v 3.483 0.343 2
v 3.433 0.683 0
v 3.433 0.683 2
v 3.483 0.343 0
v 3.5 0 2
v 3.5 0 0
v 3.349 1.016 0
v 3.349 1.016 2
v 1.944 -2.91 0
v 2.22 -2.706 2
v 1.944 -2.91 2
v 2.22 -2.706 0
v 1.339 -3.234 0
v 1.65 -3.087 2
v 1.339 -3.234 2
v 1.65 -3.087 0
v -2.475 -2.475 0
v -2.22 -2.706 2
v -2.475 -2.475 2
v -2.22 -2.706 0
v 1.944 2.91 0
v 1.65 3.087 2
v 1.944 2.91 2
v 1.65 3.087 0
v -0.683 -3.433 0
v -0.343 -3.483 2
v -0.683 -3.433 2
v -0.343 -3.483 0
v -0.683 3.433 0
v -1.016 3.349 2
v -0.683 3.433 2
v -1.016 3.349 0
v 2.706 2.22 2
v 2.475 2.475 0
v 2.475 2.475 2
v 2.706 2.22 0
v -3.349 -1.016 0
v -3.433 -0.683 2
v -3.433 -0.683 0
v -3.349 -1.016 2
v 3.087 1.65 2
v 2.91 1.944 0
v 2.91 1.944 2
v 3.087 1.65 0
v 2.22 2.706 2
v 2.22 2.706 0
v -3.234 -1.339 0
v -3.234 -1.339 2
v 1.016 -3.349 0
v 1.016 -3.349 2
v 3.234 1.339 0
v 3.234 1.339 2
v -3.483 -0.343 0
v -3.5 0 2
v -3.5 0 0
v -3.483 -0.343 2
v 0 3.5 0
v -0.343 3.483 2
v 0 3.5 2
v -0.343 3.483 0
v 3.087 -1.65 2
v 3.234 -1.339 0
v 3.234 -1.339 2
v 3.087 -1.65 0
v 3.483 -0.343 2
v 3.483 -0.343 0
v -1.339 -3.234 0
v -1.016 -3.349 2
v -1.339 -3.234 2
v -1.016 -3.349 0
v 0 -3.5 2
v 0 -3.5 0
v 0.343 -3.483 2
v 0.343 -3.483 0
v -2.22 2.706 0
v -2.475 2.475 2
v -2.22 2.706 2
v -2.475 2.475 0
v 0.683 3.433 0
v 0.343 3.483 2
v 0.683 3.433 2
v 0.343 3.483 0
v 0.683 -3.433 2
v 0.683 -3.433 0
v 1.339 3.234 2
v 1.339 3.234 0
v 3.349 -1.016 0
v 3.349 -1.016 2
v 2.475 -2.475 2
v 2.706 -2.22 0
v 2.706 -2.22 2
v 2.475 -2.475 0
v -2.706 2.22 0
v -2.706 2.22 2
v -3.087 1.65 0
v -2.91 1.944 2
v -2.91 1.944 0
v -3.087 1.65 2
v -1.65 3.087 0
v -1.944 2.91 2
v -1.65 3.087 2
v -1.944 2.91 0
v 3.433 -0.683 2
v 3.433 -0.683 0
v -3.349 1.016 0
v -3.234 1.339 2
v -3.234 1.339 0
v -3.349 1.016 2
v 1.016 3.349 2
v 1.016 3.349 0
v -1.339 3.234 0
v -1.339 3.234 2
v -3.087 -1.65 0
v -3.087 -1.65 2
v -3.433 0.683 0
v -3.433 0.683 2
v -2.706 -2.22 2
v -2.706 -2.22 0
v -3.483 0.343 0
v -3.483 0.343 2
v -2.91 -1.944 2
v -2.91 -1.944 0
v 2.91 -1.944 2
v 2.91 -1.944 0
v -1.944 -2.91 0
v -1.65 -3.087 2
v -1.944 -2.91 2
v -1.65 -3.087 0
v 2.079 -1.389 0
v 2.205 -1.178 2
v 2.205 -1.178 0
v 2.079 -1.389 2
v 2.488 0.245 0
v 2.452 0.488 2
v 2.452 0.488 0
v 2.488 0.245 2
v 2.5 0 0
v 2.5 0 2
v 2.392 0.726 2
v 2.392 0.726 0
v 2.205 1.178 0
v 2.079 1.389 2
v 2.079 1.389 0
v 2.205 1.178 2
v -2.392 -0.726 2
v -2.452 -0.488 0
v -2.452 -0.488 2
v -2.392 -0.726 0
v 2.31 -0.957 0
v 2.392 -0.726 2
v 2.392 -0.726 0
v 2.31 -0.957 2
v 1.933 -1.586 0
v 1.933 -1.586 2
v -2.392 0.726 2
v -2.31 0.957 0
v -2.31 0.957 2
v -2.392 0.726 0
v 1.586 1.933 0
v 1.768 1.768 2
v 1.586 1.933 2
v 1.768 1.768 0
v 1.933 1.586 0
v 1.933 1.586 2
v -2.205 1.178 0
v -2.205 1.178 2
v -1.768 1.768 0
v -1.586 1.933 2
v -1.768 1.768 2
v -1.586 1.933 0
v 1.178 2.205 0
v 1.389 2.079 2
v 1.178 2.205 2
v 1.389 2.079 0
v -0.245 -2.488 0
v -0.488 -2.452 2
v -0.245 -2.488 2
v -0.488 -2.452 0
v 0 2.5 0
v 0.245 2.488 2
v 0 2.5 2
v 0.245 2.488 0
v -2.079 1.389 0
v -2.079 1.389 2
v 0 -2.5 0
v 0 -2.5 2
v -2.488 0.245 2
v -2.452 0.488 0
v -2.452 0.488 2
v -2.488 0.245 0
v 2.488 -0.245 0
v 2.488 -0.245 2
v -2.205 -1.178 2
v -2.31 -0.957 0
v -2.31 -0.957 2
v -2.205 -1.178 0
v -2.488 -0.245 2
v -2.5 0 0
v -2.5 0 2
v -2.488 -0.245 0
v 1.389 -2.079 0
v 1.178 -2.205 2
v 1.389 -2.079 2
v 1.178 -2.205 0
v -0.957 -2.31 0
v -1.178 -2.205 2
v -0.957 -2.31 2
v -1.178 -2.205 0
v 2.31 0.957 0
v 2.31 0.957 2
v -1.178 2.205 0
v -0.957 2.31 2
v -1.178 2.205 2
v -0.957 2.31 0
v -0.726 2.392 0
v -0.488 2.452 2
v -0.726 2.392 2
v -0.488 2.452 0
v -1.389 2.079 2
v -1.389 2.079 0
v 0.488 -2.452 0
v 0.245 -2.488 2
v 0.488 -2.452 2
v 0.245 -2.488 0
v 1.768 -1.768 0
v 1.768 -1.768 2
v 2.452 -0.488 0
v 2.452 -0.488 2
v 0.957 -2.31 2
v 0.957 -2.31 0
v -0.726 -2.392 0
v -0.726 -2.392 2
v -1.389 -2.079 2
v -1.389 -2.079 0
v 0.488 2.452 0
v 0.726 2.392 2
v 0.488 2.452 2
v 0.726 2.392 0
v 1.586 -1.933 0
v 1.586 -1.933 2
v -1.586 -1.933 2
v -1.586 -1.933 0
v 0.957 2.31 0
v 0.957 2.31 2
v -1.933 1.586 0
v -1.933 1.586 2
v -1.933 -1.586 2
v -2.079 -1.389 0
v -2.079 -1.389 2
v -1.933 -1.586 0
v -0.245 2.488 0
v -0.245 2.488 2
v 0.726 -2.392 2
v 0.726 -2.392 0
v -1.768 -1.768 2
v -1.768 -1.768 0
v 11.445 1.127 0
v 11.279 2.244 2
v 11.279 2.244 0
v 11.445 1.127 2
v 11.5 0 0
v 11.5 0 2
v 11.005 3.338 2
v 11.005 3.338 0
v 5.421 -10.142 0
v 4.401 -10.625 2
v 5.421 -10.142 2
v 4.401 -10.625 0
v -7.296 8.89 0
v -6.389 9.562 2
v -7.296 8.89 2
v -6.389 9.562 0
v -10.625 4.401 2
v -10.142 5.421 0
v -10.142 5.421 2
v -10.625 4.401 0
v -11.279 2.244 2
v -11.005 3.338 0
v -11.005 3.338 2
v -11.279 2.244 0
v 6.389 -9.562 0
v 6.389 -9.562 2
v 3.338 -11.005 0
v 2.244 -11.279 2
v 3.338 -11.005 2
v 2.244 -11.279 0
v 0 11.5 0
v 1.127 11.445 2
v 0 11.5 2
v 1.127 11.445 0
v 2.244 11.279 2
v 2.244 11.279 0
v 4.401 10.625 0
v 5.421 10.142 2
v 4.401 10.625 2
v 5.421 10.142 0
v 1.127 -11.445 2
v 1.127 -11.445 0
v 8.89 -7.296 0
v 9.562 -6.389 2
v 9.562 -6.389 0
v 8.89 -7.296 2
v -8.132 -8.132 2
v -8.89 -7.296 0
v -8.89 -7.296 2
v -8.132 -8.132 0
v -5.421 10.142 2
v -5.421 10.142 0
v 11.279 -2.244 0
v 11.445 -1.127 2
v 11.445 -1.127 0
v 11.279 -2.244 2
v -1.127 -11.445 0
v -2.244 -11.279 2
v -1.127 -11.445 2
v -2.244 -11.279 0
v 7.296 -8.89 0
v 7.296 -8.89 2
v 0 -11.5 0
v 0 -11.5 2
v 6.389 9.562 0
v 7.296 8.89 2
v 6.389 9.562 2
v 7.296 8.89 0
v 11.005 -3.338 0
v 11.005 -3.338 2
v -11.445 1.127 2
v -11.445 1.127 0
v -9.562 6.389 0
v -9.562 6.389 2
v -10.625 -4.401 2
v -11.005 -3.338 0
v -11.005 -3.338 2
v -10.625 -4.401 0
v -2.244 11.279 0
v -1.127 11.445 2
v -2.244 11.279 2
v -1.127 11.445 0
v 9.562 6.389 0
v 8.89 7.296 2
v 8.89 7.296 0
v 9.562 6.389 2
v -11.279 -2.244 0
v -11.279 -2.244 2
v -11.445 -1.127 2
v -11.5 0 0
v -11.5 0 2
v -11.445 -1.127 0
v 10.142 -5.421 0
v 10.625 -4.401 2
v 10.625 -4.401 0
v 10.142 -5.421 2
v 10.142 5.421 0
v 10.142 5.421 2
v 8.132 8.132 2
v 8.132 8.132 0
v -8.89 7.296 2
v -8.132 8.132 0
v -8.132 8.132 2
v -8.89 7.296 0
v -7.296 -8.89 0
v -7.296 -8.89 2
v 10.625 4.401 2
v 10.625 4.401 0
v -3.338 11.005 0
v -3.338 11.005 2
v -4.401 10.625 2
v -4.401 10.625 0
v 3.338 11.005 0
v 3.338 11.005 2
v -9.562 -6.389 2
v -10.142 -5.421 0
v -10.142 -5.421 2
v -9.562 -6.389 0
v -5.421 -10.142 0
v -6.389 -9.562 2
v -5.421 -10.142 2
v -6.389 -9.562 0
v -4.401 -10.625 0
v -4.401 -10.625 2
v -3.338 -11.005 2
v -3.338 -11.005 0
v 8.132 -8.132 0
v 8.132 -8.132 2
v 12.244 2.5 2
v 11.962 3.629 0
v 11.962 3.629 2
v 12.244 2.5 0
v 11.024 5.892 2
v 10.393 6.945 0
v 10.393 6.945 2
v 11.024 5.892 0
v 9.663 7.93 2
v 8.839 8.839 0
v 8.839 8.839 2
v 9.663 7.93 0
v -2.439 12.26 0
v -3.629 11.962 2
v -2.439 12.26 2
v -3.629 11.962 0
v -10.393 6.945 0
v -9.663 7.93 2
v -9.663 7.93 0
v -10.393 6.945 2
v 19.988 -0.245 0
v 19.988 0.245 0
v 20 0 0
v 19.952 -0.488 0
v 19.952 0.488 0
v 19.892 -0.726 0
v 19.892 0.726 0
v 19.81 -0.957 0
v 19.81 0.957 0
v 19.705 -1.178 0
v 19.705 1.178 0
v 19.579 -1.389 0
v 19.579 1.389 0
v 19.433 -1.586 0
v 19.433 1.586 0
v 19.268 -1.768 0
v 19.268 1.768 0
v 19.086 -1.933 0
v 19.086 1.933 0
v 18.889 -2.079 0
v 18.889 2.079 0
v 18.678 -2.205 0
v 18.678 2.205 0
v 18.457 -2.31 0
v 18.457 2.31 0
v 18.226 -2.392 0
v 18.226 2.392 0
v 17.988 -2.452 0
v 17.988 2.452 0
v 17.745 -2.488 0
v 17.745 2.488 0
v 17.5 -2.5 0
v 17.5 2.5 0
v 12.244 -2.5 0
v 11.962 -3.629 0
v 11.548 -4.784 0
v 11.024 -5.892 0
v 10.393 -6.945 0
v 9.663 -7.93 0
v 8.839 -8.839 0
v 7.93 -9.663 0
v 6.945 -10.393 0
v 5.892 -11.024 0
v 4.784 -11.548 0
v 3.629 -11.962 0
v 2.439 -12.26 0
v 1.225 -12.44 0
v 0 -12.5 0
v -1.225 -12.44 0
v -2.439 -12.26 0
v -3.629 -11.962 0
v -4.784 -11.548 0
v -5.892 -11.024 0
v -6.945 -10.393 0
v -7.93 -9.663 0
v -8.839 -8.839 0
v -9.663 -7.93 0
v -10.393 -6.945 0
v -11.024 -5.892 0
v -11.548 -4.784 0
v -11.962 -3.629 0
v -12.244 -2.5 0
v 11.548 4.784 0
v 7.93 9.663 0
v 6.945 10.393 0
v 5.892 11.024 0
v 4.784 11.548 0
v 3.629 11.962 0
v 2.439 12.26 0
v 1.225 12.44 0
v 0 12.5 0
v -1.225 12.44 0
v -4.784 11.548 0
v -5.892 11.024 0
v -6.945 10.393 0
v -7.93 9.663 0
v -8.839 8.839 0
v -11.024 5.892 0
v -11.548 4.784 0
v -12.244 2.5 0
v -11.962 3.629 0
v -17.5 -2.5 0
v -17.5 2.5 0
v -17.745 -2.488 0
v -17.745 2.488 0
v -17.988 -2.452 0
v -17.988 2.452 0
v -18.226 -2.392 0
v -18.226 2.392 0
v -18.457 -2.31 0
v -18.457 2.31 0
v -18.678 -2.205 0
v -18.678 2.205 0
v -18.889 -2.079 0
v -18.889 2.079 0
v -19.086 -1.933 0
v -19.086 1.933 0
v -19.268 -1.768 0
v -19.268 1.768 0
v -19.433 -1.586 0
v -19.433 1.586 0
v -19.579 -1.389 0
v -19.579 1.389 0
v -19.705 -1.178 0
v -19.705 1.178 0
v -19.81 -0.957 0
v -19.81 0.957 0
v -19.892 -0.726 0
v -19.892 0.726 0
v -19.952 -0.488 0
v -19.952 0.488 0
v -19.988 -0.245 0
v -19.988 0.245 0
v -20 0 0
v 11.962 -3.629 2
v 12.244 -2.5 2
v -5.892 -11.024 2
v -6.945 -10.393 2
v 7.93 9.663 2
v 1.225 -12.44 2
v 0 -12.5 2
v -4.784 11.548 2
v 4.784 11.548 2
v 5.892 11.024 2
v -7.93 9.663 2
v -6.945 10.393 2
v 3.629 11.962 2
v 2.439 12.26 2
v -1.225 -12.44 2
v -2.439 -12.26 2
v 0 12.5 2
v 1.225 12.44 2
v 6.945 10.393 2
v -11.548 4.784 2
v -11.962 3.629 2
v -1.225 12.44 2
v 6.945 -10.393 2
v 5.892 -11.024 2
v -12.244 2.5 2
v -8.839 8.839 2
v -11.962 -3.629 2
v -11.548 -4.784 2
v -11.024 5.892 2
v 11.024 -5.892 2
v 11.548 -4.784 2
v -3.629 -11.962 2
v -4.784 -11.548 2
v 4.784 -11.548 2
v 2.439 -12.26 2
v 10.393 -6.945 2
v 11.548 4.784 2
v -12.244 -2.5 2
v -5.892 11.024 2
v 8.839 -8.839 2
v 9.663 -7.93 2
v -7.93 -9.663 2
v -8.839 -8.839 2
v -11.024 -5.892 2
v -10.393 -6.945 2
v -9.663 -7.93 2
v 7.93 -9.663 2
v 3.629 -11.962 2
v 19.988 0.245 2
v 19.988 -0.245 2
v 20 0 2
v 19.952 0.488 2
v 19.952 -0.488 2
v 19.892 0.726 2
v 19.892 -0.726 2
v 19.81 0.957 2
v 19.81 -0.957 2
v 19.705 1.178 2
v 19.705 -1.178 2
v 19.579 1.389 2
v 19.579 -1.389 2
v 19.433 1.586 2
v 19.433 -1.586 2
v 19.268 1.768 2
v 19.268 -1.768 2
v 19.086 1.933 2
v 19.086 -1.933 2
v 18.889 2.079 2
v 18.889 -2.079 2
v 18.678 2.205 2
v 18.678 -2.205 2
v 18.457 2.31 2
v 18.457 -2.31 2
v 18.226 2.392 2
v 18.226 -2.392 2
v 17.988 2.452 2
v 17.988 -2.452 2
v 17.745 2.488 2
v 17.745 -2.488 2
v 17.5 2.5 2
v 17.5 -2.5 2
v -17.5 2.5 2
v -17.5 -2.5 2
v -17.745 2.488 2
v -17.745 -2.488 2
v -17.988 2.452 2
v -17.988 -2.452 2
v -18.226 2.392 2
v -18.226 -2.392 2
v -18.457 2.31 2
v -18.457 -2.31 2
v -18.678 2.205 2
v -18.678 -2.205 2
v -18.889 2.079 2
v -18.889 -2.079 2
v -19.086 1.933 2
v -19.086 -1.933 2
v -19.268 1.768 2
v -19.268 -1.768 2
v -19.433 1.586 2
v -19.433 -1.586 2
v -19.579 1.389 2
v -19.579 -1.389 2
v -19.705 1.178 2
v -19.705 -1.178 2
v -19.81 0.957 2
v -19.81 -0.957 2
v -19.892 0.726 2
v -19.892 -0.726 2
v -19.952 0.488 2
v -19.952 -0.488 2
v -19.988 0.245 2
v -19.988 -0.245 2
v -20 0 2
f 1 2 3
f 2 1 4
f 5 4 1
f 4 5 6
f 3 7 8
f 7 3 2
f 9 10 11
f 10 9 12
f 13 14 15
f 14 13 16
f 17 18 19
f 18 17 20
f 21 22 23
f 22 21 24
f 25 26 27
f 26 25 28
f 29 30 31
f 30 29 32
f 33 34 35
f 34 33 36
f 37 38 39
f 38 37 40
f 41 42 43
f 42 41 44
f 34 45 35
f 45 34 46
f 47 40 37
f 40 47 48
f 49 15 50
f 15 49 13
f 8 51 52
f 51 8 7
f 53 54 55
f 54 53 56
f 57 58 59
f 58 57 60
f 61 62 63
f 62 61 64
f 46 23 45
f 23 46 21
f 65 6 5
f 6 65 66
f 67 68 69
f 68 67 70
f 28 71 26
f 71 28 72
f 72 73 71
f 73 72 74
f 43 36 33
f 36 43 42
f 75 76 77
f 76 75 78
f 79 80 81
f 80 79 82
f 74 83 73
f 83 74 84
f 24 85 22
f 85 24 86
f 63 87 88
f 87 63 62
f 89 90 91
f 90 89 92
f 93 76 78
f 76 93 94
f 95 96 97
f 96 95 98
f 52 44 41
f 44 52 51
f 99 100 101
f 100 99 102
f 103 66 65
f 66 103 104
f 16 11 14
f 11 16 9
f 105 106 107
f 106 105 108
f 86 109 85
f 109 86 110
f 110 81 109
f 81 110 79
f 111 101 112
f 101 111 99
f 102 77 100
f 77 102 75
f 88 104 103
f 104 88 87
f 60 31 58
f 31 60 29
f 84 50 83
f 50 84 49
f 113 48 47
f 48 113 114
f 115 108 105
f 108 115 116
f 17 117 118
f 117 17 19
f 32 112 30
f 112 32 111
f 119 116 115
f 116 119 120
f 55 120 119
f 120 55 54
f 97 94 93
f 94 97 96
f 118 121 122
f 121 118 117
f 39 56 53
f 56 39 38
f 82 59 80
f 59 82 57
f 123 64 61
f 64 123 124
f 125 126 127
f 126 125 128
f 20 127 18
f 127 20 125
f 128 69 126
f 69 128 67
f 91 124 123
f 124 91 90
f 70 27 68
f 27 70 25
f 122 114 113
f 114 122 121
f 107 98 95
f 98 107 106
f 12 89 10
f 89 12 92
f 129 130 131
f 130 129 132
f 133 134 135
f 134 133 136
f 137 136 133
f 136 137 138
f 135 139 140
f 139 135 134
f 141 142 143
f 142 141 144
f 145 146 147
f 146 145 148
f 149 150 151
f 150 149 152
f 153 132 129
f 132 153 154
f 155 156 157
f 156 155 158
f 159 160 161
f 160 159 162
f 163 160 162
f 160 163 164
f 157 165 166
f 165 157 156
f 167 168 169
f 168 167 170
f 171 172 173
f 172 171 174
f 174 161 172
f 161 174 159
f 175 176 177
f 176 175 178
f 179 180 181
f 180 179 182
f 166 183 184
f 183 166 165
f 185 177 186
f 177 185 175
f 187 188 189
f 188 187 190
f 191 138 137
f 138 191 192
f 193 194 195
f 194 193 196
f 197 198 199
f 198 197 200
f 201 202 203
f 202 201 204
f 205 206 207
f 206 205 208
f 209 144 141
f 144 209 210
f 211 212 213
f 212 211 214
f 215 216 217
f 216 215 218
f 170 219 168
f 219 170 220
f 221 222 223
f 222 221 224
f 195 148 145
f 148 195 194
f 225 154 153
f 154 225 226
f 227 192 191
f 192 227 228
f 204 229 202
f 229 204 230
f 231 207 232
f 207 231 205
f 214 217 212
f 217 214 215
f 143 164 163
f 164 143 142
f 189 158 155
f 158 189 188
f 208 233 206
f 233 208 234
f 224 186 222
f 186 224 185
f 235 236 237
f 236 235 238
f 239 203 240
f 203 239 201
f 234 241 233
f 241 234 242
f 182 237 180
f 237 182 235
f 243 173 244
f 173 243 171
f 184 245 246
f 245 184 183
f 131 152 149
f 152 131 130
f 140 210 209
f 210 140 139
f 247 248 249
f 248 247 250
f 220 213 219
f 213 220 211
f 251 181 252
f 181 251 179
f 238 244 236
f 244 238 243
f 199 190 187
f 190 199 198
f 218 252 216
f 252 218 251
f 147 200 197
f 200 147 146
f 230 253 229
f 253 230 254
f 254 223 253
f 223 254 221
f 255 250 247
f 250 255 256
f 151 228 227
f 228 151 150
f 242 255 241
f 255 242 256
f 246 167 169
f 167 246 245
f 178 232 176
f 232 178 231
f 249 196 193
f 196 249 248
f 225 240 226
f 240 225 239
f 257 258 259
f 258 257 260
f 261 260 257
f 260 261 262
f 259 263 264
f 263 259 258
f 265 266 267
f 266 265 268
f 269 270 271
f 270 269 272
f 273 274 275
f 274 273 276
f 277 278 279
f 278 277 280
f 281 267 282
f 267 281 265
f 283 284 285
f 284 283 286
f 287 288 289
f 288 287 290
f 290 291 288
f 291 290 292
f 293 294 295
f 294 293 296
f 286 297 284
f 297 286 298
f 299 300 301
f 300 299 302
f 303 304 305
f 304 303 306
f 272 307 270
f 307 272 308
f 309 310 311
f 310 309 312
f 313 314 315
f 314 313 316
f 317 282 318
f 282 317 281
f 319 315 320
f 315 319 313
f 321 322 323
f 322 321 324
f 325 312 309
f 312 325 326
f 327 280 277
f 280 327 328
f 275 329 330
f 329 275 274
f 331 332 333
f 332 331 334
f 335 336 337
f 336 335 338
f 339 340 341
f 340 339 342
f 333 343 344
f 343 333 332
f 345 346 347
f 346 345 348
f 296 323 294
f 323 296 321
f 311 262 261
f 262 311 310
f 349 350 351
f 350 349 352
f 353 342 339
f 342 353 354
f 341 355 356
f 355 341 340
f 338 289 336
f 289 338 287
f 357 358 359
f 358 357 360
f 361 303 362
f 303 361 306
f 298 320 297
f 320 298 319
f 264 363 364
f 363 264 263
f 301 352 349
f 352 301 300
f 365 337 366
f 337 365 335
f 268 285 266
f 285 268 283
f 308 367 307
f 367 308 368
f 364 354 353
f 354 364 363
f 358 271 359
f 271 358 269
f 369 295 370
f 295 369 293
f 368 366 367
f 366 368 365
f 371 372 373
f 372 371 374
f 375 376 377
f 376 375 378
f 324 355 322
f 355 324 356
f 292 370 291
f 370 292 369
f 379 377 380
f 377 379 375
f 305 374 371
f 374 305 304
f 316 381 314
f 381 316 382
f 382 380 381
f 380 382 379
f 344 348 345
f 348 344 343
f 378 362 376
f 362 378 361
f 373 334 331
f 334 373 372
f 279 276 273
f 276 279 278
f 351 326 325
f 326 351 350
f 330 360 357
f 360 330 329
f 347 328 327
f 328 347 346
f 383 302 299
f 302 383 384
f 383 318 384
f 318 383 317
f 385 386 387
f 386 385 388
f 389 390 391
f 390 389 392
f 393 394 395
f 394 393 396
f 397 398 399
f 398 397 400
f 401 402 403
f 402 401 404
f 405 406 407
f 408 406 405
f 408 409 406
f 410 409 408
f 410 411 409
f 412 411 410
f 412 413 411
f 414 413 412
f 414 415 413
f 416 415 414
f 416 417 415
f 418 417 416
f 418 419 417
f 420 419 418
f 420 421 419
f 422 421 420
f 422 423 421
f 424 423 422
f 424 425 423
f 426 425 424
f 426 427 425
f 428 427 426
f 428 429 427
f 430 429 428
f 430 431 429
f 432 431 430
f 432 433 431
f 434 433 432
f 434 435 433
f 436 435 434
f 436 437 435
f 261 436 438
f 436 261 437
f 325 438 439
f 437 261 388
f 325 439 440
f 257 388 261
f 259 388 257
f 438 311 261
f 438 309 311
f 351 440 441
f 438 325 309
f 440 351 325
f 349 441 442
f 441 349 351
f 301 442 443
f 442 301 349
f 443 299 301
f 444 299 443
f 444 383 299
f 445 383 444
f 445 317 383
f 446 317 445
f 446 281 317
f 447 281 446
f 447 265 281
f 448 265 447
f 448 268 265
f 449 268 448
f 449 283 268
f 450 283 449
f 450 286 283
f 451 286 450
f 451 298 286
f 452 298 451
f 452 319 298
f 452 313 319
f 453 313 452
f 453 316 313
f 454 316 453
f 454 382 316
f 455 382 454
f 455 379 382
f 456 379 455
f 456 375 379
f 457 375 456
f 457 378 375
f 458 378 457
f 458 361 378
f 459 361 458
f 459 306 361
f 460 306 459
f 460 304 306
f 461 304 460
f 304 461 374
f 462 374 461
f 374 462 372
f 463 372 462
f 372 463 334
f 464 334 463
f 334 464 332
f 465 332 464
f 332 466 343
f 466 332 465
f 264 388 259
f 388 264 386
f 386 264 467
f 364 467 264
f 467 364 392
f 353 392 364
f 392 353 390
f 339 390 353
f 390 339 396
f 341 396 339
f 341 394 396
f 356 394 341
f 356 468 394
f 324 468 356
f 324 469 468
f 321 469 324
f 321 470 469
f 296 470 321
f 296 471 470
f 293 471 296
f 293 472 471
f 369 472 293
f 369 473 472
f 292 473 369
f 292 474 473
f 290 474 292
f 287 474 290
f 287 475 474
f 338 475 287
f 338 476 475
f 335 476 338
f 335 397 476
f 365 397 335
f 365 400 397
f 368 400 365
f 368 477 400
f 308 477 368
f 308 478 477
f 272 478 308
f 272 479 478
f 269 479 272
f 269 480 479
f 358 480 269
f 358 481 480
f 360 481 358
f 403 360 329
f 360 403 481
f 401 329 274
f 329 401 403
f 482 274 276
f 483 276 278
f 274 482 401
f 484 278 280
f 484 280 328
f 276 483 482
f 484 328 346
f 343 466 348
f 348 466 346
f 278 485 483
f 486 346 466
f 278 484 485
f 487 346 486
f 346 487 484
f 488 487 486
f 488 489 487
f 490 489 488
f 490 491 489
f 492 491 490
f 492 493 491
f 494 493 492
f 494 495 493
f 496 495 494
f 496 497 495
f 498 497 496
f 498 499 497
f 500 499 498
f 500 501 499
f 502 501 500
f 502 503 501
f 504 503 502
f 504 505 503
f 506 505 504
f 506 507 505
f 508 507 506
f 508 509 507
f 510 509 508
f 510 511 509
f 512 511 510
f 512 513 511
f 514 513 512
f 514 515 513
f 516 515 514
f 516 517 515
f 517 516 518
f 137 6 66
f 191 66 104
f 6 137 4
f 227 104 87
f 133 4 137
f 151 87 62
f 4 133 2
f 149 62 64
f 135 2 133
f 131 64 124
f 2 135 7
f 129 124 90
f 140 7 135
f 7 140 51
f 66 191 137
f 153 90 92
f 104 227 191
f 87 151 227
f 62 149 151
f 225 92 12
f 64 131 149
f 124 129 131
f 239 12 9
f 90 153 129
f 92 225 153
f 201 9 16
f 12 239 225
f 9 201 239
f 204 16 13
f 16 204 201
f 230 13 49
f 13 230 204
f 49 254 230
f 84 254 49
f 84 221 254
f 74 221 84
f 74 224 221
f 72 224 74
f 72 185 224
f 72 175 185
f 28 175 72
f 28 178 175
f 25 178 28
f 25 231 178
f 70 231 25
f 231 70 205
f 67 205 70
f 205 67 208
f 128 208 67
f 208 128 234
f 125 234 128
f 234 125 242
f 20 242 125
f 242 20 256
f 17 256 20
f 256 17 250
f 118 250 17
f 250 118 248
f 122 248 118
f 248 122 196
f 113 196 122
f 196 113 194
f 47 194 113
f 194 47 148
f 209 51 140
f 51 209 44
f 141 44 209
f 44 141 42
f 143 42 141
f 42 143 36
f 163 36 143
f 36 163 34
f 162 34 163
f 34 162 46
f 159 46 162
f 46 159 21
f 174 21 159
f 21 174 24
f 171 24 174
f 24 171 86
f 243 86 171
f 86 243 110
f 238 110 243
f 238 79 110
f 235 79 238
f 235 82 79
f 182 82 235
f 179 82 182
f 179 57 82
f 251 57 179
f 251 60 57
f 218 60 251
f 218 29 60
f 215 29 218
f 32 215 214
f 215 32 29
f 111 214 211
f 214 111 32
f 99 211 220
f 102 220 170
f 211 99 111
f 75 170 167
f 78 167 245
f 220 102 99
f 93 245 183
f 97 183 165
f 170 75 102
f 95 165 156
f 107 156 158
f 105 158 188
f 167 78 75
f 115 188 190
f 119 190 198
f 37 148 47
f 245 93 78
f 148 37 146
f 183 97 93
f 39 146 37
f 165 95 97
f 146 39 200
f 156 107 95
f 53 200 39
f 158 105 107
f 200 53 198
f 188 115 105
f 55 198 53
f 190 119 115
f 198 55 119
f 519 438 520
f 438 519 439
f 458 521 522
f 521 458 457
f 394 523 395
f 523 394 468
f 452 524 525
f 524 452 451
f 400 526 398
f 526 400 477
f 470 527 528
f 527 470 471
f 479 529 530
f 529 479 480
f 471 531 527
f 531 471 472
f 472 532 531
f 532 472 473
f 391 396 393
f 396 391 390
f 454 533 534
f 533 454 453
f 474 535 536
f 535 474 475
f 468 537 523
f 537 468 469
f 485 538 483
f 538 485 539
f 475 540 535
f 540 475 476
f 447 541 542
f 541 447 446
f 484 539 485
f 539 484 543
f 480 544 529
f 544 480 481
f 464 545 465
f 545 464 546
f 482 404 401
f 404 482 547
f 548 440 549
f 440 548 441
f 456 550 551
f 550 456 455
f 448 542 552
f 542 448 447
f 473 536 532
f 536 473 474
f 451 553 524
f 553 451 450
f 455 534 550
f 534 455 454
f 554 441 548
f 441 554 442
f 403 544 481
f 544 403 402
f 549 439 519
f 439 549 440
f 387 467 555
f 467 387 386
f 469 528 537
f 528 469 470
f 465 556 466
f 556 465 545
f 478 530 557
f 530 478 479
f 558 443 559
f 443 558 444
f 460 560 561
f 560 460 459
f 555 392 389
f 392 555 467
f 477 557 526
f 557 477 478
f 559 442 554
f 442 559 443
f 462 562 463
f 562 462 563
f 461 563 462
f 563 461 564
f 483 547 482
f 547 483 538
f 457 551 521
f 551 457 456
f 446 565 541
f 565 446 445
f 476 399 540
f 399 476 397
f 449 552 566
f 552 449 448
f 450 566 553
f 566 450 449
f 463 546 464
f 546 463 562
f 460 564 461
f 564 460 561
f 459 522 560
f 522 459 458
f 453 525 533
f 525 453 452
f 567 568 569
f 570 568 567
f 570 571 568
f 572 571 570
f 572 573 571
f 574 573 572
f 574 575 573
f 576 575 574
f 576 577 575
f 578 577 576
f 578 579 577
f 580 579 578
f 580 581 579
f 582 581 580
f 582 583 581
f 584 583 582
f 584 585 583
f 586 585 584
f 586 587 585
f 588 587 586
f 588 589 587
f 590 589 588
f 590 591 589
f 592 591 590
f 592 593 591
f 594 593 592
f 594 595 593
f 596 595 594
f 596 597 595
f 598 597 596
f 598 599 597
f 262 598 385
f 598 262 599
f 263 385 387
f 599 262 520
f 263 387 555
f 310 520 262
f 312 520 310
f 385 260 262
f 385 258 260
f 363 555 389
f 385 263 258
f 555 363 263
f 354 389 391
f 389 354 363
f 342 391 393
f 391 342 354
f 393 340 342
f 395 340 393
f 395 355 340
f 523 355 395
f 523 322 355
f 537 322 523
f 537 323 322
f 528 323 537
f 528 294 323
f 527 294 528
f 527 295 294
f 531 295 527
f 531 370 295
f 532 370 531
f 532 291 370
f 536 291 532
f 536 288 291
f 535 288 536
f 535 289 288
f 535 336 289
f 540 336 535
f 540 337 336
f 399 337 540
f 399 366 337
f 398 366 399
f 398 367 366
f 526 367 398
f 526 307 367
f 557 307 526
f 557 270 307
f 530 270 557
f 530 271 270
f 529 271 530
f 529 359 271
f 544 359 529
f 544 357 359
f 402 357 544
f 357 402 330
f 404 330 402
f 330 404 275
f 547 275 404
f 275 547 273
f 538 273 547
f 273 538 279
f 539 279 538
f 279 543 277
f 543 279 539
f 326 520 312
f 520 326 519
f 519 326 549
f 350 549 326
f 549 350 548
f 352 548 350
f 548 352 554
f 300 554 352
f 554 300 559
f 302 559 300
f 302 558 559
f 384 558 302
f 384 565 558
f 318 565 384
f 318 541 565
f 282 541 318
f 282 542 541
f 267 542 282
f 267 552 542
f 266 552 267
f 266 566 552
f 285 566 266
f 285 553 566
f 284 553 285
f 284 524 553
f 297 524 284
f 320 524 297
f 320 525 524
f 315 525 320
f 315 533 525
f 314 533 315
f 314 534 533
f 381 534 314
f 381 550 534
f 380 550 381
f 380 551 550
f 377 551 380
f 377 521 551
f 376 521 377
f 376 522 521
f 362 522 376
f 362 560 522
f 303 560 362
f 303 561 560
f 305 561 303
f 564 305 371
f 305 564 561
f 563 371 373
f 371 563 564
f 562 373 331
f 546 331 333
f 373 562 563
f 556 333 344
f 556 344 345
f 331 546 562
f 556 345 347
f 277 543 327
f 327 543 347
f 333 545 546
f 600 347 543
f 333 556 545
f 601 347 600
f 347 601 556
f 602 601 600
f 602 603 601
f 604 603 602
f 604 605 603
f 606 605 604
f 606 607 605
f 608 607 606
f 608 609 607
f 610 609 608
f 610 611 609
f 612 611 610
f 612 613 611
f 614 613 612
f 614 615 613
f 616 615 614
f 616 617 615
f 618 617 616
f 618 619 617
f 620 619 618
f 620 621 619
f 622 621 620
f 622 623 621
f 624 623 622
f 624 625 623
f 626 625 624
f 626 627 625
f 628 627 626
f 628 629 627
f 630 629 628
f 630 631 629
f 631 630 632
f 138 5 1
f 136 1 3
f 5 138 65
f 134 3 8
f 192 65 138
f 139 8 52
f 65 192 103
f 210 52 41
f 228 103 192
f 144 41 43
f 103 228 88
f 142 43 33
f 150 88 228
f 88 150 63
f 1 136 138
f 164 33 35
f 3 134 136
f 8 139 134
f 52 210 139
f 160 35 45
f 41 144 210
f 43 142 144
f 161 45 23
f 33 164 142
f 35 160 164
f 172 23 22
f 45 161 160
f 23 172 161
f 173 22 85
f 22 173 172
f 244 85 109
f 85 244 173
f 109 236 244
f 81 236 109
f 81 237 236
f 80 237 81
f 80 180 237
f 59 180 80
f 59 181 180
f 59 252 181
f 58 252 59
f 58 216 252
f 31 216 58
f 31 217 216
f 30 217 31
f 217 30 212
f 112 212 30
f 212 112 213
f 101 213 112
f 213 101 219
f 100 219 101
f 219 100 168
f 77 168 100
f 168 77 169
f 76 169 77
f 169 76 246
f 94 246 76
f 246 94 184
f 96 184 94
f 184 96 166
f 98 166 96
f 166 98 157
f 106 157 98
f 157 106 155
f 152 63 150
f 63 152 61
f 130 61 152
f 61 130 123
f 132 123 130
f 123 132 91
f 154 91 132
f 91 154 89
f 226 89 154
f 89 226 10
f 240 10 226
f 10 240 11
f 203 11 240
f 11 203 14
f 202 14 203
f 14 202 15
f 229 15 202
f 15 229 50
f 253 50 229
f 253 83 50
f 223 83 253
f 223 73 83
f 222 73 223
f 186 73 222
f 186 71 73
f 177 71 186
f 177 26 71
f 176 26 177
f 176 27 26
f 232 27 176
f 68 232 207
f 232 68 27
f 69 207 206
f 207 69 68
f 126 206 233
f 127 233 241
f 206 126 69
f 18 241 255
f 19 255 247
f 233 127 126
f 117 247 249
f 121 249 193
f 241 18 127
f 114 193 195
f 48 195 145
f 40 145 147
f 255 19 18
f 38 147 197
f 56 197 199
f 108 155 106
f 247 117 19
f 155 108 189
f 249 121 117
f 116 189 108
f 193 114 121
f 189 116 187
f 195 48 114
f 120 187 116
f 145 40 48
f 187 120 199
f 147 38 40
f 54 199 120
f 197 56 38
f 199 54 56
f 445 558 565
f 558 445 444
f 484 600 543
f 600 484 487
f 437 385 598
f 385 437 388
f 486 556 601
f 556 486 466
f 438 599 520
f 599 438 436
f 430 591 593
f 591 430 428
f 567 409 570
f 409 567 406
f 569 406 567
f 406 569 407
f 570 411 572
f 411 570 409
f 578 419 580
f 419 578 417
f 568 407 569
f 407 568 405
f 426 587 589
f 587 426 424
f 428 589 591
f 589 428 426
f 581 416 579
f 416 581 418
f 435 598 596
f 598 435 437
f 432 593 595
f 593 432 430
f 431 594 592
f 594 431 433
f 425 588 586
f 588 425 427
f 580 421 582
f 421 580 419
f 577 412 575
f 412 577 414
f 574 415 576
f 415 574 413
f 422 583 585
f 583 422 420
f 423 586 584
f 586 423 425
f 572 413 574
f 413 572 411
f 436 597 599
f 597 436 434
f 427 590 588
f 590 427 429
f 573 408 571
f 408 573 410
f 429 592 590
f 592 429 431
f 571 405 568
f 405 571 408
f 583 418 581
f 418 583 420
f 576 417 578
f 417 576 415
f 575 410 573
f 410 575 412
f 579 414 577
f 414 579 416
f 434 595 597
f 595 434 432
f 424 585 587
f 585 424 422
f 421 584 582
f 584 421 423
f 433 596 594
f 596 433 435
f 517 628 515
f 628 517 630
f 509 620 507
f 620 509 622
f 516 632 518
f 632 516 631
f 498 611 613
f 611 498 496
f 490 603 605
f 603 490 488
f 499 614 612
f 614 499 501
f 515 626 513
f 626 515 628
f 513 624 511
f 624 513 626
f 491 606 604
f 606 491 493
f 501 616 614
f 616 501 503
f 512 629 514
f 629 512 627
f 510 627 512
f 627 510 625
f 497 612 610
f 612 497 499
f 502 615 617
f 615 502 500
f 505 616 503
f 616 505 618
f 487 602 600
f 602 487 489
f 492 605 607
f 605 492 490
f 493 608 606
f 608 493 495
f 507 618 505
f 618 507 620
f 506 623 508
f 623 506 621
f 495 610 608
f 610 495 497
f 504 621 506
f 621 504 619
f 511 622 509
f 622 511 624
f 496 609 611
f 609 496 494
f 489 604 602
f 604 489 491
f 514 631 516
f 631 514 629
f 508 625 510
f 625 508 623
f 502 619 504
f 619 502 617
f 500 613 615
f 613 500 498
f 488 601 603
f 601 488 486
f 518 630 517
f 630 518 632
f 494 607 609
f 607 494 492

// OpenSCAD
$fn=64;

rotator_diameter=25;
rotator_wall=2;
rotator_height=2;
rotator_mount_inner=5;
rotator_mount_thickness=1;

wing_length=5;
wing_width=5;

diff=0.1;

//core
difference() {
    cylinder(h=rotator_height, d=rotator_diameter);
    translate([0,0,-diff]) difference() {
        cylinder(h=rotator_height+2*diff, d=rotator_diameter-rotator_wall);
        difference() {
            cylinder(h=rotator_height+2*diff, d=rotator_mount_inner+2*rotator_mount_thickness);
            cylinder(h=rotator_height+2*diff, d=rotator_mount_inner);
        }
    }
}

//wings
difference() {
    union() {
        translate([0,0,rotator_height/2]) cube([rotator_diameter+wing_length*2,wing_width,rotator_height], center = true);
        translate([rotator_diameter/2+wing_length,0,0]) cylinder(h=rotator_height, d=wing_width);
        translate([-rotator_diameter/2-wing_length,0,0]) cylinder(h=rotator_height, d=wing_width);
    }
    translate([0,0,-diff]) cylinder(h=rotator_height+2*diff, d=rotator_diameter);
}
